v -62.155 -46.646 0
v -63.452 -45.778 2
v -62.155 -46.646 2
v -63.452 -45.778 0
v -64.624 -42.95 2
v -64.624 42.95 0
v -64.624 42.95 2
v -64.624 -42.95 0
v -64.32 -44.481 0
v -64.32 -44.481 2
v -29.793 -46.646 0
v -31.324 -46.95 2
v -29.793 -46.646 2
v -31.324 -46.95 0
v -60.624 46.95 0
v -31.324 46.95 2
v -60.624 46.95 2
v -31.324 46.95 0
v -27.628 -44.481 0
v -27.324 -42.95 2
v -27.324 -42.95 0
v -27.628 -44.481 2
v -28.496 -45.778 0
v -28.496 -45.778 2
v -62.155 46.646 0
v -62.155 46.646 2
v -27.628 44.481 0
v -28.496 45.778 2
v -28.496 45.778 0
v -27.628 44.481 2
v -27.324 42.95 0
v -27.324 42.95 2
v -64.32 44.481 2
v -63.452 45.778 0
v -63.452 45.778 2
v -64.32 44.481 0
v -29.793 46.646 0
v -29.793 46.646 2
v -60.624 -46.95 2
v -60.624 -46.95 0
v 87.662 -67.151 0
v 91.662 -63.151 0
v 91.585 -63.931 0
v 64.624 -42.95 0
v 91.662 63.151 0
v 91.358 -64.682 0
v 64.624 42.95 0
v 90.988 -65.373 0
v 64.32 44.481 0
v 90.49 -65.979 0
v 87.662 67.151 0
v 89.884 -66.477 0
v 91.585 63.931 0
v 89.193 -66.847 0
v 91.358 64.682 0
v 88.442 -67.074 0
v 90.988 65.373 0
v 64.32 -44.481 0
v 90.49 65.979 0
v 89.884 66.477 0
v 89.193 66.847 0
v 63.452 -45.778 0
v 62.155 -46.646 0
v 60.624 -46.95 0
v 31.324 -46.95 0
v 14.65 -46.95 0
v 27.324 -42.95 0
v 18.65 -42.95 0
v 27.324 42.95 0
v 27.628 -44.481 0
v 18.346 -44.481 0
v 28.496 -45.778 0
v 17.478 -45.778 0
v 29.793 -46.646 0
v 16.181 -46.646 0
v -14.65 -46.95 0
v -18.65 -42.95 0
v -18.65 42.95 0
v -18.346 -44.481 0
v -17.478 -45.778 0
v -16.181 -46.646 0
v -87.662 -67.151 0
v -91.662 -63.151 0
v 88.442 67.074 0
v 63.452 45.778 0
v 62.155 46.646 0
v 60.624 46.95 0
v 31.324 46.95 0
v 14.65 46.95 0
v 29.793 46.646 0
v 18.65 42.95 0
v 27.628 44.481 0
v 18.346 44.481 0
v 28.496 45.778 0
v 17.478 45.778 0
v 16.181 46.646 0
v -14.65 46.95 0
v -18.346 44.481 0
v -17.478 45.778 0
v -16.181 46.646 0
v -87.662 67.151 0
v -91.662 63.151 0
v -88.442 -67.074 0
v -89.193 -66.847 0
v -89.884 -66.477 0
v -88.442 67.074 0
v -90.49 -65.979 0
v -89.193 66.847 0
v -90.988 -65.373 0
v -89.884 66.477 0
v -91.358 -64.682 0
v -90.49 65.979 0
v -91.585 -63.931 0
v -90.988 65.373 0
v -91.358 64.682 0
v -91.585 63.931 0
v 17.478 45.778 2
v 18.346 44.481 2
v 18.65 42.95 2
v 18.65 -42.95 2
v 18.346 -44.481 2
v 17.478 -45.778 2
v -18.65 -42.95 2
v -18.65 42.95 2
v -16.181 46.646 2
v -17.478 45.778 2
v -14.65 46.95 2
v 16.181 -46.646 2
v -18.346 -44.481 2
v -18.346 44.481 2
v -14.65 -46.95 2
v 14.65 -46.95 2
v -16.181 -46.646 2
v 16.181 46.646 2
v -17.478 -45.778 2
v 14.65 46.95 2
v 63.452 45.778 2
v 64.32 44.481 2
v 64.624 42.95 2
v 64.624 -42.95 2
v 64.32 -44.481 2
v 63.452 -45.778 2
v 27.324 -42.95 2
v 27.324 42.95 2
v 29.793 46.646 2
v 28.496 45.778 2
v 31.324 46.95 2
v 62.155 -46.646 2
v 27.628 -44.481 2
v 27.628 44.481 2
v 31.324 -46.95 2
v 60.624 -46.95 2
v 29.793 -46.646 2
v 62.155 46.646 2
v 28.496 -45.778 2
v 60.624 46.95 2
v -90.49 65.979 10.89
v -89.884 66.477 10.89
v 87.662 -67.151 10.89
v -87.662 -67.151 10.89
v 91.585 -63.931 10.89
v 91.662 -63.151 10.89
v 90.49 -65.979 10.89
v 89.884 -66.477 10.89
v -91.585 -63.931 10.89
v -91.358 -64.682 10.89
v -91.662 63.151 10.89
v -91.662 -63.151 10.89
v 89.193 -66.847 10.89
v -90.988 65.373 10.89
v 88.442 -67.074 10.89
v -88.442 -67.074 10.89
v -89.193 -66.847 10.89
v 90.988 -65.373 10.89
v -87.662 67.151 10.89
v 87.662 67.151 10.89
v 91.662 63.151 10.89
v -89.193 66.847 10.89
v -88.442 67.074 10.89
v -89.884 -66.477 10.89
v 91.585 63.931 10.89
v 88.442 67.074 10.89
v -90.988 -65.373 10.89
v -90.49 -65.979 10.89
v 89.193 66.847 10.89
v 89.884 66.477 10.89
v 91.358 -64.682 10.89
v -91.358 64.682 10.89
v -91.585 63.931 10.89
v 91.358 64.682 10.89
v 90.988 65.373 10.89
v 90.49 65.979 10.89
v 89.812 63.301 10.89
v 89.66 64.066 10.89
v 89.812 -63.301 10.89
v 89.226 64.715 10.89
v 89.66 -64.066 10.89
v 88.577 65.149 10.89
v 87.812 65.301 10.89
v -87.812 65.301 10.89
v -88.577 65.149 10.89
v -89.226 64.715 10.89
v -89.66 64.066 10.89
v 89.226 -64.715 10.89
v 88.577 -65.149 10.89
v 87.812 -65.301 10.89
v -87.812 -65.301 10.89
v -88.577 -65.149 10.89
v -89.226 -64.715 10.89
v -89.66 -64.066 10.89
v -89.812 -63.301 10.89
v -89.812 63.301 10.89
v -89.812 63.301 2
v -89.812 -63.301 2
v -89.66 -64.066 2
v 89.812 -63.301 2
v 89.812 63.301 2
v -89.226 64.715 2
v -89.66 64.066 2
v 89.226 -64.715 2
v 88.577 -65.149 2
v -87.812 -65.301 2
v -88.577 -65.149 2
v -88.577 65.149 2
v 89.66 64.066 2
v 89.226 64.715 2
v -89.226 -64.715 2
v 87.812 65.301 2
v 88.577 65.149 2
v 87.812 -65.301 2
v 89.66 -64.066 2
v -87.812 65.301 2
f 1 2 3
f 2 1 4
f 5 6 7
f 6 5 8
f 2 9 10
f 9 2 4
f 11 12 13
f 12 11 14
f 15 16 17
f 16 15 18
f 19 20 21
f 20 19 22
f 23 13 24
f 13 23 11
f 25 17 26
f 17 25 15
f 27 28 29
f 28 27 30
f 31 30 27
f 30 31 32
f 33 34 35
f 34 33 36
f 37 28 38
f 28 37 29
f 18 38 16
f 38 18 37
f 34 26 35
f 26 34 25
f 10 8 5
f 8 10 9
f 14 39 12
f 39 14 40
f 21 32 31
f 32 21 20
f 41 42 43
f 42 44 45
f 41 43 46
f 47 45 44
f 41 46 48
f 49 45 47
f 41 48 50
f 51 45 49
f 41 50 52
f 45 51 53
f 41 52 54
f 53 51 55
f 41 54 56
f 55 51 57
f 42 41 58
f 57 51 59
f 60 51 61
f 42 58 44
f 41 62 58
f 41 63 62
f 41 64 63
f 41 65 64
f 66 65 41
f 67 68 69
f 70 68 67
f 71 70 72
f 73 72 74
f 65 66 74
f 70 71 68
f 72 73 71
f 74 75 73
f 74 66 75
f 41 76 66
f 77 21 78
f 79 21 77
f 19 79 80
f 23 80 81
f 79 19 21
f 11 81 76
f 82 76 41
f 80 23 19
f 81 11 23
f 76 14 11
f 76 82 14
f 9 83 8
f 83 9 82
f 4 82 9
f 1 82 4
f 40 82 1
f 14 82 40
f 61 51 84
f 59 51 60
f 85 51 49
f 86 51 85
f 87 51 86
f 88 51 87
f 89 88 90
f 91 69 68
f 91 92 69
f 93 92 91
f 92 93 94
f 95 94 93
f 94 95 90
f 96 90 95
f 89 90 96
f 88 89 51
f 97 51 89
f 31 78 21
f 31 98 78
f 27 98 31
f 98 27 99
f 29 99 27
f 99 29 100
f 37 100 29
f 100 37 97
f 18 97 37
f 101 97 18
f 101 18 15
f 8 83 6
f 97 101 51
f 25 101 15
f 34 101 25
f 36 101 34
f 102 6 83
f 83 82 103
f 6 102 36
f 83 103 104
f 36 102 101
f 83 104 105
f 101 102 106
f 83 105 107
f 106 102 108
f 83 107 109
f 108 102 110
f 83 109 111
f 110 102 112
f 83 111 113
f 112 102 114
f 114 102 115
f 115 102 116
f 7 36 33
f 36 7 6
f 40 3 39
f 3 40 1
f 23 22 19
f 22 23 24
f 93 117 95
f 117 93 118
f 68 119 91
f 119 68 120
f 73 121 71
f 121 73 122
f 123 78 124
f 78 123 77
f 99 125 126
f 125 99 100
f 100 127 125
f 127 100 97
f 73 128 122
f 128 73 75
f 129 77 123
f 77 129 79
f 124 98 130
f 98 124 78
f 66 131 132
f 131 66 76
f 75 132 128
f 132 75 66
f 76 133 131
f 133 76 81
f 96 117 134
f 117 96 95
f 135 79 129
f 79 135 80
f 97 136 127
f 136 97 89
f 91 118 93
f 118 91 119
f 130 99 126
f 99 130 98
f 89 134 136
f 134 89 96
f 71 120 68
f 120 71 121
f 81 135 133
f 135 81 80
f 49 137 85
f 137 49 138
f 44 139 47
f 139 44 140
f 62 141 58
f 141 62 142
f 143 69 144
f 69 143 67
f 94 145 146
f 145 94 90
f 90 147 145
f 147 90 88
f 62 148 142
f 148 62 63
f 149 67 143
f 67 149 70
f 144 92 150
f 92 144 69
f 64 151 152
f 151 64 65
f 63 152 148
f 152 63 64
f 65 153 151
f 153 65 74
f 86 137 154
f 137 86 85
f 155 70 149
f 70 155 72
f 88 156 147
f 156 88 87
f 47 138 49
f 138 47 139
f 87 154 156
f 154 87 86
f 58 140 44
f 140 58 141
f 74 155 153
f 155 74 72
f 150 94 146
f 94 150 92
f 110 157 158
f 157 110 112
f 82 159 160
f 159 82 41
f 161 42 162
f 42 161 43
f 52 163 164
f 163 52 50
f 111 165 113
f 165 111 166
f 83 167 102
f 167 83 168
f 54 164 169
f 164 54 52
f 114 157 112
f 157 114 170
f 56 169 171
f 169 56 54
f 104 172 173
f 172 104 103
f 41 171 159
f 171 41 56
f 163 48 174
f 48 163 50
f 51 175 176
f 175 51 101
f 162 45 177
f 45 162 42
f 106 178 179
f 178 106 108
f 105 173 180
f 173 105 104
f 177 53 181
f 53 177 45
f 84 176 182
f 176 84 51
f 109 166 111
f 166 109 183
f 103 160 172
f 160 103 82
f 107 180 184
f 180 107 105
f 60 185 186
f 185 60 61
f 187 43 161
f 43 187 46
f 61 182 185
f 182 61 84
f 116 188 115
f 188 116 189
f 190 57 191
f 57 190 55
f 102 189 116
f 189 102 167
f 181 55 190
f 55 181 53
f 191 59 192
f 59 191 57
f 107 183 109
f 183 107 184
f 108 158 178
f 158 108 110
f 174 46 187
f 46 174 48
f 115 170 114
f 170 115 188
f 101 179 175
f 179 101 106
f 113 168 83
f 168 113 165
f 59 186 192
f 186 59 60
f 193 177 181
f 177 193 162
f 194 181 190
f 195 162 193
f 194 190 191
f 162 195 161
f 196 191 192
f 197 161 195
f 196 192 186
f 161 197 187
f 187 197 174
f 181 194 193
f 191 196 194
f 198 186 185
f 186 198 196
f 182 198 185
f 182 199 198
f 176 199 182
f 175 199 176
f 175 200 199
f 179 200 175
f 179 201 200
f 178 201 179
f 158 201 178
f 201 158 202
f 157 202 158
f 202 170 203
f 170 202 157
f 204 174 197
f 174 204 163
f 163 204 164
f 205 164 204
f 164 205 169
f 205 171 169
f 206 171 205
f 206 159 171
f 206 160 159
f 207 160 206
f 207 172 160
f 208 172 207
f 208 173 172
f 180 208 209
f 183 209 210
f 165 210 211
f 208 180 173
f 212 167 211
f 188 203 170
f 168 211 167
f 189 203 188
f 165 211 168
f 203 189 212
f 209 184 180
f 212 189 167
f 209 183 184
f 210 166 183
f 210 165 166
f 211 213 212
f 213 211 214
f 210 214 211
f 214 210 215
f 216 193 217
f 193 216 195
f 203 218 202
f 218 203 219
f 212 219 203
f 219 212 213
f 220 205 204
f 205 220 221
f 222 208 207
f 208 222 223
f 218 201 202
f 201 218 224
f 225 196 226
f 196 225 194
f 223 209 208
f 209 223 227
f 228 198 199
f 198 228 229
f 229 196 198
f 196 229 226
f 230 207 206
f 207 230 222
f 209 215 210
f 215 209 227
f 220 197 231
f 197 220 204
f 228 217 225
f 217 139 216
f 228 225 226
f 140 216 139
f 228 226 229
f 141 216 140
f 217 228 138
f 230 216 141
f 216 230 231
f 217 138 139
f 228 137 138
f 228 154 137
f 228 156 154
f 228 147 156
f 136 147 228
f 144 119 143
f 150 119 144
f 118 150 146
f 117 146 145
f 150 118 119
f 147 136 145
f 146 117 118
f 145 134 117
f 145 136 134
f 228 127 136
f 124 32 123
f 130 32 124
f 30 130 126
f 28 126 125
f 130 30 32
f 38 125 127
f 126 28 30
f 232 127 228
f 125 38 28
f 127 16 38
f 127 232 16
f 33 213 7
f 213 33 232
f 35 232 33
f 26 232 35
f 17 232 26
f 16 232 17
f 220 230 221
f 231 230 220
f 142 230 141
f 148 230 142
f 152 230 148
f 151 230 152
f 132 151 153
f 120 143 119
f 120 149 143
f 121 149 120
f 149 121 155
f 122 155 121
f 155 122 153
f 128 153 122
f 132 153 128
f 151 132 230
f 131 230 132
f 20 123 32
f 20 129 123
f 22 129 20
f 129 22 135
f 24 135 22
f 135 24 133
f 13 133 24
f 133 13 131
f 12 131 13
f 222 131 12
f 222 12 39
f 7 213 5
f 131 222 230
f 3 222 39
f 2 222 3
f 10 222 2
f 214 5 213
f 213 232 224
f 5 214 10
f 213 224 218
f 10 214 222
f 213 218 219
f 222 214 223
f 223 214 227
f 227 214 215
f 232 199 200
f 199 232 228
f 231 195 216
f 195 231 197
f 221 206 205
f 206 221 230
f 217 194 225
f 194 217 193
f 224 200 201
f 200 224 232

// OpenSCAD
// file: common.scad
module cube_center(dims,r=0,$fn=16) {
    if(r==0) {
        translate([-dims[0]/2, -dims[1]/2, 0])
        cube(dims);
    } else {
        minkowski() {
            translate([-(dims[0]-2*r)/2, -(dims[1]-2*r)/2, 0])
            cube([dims[0]-2*r,dims[1]-2*r,dims[2]]);
            cylinder(r=r,$fn=$fn,h=0.0001);
        }
   }
}
// main file
include<common.scad>


thick = 2;
eps = 0.001;
tol = 0.3;

gang_spacing = 1.81 * 25.4;

width = 7.06 * 25.4;
height = 5.13 * 25.4;
depth = 0.35 * 25.4;

hole_width=35.3+thick;
hole_height=91.9+thick;
hole_r=4;


difference() {
cube_center([width+2*thick,height+2*thick,depth+thick],r=4, $fn=32);

translate([0,0,2])
cube_center([width+tol,height+tol,depth+eps],r=2);


for(i=[-1,0,1])
translate([i*gang_spacing,0,0])
cube_center([hole_width,hole_height,thick*2],r=hole_r);

}
